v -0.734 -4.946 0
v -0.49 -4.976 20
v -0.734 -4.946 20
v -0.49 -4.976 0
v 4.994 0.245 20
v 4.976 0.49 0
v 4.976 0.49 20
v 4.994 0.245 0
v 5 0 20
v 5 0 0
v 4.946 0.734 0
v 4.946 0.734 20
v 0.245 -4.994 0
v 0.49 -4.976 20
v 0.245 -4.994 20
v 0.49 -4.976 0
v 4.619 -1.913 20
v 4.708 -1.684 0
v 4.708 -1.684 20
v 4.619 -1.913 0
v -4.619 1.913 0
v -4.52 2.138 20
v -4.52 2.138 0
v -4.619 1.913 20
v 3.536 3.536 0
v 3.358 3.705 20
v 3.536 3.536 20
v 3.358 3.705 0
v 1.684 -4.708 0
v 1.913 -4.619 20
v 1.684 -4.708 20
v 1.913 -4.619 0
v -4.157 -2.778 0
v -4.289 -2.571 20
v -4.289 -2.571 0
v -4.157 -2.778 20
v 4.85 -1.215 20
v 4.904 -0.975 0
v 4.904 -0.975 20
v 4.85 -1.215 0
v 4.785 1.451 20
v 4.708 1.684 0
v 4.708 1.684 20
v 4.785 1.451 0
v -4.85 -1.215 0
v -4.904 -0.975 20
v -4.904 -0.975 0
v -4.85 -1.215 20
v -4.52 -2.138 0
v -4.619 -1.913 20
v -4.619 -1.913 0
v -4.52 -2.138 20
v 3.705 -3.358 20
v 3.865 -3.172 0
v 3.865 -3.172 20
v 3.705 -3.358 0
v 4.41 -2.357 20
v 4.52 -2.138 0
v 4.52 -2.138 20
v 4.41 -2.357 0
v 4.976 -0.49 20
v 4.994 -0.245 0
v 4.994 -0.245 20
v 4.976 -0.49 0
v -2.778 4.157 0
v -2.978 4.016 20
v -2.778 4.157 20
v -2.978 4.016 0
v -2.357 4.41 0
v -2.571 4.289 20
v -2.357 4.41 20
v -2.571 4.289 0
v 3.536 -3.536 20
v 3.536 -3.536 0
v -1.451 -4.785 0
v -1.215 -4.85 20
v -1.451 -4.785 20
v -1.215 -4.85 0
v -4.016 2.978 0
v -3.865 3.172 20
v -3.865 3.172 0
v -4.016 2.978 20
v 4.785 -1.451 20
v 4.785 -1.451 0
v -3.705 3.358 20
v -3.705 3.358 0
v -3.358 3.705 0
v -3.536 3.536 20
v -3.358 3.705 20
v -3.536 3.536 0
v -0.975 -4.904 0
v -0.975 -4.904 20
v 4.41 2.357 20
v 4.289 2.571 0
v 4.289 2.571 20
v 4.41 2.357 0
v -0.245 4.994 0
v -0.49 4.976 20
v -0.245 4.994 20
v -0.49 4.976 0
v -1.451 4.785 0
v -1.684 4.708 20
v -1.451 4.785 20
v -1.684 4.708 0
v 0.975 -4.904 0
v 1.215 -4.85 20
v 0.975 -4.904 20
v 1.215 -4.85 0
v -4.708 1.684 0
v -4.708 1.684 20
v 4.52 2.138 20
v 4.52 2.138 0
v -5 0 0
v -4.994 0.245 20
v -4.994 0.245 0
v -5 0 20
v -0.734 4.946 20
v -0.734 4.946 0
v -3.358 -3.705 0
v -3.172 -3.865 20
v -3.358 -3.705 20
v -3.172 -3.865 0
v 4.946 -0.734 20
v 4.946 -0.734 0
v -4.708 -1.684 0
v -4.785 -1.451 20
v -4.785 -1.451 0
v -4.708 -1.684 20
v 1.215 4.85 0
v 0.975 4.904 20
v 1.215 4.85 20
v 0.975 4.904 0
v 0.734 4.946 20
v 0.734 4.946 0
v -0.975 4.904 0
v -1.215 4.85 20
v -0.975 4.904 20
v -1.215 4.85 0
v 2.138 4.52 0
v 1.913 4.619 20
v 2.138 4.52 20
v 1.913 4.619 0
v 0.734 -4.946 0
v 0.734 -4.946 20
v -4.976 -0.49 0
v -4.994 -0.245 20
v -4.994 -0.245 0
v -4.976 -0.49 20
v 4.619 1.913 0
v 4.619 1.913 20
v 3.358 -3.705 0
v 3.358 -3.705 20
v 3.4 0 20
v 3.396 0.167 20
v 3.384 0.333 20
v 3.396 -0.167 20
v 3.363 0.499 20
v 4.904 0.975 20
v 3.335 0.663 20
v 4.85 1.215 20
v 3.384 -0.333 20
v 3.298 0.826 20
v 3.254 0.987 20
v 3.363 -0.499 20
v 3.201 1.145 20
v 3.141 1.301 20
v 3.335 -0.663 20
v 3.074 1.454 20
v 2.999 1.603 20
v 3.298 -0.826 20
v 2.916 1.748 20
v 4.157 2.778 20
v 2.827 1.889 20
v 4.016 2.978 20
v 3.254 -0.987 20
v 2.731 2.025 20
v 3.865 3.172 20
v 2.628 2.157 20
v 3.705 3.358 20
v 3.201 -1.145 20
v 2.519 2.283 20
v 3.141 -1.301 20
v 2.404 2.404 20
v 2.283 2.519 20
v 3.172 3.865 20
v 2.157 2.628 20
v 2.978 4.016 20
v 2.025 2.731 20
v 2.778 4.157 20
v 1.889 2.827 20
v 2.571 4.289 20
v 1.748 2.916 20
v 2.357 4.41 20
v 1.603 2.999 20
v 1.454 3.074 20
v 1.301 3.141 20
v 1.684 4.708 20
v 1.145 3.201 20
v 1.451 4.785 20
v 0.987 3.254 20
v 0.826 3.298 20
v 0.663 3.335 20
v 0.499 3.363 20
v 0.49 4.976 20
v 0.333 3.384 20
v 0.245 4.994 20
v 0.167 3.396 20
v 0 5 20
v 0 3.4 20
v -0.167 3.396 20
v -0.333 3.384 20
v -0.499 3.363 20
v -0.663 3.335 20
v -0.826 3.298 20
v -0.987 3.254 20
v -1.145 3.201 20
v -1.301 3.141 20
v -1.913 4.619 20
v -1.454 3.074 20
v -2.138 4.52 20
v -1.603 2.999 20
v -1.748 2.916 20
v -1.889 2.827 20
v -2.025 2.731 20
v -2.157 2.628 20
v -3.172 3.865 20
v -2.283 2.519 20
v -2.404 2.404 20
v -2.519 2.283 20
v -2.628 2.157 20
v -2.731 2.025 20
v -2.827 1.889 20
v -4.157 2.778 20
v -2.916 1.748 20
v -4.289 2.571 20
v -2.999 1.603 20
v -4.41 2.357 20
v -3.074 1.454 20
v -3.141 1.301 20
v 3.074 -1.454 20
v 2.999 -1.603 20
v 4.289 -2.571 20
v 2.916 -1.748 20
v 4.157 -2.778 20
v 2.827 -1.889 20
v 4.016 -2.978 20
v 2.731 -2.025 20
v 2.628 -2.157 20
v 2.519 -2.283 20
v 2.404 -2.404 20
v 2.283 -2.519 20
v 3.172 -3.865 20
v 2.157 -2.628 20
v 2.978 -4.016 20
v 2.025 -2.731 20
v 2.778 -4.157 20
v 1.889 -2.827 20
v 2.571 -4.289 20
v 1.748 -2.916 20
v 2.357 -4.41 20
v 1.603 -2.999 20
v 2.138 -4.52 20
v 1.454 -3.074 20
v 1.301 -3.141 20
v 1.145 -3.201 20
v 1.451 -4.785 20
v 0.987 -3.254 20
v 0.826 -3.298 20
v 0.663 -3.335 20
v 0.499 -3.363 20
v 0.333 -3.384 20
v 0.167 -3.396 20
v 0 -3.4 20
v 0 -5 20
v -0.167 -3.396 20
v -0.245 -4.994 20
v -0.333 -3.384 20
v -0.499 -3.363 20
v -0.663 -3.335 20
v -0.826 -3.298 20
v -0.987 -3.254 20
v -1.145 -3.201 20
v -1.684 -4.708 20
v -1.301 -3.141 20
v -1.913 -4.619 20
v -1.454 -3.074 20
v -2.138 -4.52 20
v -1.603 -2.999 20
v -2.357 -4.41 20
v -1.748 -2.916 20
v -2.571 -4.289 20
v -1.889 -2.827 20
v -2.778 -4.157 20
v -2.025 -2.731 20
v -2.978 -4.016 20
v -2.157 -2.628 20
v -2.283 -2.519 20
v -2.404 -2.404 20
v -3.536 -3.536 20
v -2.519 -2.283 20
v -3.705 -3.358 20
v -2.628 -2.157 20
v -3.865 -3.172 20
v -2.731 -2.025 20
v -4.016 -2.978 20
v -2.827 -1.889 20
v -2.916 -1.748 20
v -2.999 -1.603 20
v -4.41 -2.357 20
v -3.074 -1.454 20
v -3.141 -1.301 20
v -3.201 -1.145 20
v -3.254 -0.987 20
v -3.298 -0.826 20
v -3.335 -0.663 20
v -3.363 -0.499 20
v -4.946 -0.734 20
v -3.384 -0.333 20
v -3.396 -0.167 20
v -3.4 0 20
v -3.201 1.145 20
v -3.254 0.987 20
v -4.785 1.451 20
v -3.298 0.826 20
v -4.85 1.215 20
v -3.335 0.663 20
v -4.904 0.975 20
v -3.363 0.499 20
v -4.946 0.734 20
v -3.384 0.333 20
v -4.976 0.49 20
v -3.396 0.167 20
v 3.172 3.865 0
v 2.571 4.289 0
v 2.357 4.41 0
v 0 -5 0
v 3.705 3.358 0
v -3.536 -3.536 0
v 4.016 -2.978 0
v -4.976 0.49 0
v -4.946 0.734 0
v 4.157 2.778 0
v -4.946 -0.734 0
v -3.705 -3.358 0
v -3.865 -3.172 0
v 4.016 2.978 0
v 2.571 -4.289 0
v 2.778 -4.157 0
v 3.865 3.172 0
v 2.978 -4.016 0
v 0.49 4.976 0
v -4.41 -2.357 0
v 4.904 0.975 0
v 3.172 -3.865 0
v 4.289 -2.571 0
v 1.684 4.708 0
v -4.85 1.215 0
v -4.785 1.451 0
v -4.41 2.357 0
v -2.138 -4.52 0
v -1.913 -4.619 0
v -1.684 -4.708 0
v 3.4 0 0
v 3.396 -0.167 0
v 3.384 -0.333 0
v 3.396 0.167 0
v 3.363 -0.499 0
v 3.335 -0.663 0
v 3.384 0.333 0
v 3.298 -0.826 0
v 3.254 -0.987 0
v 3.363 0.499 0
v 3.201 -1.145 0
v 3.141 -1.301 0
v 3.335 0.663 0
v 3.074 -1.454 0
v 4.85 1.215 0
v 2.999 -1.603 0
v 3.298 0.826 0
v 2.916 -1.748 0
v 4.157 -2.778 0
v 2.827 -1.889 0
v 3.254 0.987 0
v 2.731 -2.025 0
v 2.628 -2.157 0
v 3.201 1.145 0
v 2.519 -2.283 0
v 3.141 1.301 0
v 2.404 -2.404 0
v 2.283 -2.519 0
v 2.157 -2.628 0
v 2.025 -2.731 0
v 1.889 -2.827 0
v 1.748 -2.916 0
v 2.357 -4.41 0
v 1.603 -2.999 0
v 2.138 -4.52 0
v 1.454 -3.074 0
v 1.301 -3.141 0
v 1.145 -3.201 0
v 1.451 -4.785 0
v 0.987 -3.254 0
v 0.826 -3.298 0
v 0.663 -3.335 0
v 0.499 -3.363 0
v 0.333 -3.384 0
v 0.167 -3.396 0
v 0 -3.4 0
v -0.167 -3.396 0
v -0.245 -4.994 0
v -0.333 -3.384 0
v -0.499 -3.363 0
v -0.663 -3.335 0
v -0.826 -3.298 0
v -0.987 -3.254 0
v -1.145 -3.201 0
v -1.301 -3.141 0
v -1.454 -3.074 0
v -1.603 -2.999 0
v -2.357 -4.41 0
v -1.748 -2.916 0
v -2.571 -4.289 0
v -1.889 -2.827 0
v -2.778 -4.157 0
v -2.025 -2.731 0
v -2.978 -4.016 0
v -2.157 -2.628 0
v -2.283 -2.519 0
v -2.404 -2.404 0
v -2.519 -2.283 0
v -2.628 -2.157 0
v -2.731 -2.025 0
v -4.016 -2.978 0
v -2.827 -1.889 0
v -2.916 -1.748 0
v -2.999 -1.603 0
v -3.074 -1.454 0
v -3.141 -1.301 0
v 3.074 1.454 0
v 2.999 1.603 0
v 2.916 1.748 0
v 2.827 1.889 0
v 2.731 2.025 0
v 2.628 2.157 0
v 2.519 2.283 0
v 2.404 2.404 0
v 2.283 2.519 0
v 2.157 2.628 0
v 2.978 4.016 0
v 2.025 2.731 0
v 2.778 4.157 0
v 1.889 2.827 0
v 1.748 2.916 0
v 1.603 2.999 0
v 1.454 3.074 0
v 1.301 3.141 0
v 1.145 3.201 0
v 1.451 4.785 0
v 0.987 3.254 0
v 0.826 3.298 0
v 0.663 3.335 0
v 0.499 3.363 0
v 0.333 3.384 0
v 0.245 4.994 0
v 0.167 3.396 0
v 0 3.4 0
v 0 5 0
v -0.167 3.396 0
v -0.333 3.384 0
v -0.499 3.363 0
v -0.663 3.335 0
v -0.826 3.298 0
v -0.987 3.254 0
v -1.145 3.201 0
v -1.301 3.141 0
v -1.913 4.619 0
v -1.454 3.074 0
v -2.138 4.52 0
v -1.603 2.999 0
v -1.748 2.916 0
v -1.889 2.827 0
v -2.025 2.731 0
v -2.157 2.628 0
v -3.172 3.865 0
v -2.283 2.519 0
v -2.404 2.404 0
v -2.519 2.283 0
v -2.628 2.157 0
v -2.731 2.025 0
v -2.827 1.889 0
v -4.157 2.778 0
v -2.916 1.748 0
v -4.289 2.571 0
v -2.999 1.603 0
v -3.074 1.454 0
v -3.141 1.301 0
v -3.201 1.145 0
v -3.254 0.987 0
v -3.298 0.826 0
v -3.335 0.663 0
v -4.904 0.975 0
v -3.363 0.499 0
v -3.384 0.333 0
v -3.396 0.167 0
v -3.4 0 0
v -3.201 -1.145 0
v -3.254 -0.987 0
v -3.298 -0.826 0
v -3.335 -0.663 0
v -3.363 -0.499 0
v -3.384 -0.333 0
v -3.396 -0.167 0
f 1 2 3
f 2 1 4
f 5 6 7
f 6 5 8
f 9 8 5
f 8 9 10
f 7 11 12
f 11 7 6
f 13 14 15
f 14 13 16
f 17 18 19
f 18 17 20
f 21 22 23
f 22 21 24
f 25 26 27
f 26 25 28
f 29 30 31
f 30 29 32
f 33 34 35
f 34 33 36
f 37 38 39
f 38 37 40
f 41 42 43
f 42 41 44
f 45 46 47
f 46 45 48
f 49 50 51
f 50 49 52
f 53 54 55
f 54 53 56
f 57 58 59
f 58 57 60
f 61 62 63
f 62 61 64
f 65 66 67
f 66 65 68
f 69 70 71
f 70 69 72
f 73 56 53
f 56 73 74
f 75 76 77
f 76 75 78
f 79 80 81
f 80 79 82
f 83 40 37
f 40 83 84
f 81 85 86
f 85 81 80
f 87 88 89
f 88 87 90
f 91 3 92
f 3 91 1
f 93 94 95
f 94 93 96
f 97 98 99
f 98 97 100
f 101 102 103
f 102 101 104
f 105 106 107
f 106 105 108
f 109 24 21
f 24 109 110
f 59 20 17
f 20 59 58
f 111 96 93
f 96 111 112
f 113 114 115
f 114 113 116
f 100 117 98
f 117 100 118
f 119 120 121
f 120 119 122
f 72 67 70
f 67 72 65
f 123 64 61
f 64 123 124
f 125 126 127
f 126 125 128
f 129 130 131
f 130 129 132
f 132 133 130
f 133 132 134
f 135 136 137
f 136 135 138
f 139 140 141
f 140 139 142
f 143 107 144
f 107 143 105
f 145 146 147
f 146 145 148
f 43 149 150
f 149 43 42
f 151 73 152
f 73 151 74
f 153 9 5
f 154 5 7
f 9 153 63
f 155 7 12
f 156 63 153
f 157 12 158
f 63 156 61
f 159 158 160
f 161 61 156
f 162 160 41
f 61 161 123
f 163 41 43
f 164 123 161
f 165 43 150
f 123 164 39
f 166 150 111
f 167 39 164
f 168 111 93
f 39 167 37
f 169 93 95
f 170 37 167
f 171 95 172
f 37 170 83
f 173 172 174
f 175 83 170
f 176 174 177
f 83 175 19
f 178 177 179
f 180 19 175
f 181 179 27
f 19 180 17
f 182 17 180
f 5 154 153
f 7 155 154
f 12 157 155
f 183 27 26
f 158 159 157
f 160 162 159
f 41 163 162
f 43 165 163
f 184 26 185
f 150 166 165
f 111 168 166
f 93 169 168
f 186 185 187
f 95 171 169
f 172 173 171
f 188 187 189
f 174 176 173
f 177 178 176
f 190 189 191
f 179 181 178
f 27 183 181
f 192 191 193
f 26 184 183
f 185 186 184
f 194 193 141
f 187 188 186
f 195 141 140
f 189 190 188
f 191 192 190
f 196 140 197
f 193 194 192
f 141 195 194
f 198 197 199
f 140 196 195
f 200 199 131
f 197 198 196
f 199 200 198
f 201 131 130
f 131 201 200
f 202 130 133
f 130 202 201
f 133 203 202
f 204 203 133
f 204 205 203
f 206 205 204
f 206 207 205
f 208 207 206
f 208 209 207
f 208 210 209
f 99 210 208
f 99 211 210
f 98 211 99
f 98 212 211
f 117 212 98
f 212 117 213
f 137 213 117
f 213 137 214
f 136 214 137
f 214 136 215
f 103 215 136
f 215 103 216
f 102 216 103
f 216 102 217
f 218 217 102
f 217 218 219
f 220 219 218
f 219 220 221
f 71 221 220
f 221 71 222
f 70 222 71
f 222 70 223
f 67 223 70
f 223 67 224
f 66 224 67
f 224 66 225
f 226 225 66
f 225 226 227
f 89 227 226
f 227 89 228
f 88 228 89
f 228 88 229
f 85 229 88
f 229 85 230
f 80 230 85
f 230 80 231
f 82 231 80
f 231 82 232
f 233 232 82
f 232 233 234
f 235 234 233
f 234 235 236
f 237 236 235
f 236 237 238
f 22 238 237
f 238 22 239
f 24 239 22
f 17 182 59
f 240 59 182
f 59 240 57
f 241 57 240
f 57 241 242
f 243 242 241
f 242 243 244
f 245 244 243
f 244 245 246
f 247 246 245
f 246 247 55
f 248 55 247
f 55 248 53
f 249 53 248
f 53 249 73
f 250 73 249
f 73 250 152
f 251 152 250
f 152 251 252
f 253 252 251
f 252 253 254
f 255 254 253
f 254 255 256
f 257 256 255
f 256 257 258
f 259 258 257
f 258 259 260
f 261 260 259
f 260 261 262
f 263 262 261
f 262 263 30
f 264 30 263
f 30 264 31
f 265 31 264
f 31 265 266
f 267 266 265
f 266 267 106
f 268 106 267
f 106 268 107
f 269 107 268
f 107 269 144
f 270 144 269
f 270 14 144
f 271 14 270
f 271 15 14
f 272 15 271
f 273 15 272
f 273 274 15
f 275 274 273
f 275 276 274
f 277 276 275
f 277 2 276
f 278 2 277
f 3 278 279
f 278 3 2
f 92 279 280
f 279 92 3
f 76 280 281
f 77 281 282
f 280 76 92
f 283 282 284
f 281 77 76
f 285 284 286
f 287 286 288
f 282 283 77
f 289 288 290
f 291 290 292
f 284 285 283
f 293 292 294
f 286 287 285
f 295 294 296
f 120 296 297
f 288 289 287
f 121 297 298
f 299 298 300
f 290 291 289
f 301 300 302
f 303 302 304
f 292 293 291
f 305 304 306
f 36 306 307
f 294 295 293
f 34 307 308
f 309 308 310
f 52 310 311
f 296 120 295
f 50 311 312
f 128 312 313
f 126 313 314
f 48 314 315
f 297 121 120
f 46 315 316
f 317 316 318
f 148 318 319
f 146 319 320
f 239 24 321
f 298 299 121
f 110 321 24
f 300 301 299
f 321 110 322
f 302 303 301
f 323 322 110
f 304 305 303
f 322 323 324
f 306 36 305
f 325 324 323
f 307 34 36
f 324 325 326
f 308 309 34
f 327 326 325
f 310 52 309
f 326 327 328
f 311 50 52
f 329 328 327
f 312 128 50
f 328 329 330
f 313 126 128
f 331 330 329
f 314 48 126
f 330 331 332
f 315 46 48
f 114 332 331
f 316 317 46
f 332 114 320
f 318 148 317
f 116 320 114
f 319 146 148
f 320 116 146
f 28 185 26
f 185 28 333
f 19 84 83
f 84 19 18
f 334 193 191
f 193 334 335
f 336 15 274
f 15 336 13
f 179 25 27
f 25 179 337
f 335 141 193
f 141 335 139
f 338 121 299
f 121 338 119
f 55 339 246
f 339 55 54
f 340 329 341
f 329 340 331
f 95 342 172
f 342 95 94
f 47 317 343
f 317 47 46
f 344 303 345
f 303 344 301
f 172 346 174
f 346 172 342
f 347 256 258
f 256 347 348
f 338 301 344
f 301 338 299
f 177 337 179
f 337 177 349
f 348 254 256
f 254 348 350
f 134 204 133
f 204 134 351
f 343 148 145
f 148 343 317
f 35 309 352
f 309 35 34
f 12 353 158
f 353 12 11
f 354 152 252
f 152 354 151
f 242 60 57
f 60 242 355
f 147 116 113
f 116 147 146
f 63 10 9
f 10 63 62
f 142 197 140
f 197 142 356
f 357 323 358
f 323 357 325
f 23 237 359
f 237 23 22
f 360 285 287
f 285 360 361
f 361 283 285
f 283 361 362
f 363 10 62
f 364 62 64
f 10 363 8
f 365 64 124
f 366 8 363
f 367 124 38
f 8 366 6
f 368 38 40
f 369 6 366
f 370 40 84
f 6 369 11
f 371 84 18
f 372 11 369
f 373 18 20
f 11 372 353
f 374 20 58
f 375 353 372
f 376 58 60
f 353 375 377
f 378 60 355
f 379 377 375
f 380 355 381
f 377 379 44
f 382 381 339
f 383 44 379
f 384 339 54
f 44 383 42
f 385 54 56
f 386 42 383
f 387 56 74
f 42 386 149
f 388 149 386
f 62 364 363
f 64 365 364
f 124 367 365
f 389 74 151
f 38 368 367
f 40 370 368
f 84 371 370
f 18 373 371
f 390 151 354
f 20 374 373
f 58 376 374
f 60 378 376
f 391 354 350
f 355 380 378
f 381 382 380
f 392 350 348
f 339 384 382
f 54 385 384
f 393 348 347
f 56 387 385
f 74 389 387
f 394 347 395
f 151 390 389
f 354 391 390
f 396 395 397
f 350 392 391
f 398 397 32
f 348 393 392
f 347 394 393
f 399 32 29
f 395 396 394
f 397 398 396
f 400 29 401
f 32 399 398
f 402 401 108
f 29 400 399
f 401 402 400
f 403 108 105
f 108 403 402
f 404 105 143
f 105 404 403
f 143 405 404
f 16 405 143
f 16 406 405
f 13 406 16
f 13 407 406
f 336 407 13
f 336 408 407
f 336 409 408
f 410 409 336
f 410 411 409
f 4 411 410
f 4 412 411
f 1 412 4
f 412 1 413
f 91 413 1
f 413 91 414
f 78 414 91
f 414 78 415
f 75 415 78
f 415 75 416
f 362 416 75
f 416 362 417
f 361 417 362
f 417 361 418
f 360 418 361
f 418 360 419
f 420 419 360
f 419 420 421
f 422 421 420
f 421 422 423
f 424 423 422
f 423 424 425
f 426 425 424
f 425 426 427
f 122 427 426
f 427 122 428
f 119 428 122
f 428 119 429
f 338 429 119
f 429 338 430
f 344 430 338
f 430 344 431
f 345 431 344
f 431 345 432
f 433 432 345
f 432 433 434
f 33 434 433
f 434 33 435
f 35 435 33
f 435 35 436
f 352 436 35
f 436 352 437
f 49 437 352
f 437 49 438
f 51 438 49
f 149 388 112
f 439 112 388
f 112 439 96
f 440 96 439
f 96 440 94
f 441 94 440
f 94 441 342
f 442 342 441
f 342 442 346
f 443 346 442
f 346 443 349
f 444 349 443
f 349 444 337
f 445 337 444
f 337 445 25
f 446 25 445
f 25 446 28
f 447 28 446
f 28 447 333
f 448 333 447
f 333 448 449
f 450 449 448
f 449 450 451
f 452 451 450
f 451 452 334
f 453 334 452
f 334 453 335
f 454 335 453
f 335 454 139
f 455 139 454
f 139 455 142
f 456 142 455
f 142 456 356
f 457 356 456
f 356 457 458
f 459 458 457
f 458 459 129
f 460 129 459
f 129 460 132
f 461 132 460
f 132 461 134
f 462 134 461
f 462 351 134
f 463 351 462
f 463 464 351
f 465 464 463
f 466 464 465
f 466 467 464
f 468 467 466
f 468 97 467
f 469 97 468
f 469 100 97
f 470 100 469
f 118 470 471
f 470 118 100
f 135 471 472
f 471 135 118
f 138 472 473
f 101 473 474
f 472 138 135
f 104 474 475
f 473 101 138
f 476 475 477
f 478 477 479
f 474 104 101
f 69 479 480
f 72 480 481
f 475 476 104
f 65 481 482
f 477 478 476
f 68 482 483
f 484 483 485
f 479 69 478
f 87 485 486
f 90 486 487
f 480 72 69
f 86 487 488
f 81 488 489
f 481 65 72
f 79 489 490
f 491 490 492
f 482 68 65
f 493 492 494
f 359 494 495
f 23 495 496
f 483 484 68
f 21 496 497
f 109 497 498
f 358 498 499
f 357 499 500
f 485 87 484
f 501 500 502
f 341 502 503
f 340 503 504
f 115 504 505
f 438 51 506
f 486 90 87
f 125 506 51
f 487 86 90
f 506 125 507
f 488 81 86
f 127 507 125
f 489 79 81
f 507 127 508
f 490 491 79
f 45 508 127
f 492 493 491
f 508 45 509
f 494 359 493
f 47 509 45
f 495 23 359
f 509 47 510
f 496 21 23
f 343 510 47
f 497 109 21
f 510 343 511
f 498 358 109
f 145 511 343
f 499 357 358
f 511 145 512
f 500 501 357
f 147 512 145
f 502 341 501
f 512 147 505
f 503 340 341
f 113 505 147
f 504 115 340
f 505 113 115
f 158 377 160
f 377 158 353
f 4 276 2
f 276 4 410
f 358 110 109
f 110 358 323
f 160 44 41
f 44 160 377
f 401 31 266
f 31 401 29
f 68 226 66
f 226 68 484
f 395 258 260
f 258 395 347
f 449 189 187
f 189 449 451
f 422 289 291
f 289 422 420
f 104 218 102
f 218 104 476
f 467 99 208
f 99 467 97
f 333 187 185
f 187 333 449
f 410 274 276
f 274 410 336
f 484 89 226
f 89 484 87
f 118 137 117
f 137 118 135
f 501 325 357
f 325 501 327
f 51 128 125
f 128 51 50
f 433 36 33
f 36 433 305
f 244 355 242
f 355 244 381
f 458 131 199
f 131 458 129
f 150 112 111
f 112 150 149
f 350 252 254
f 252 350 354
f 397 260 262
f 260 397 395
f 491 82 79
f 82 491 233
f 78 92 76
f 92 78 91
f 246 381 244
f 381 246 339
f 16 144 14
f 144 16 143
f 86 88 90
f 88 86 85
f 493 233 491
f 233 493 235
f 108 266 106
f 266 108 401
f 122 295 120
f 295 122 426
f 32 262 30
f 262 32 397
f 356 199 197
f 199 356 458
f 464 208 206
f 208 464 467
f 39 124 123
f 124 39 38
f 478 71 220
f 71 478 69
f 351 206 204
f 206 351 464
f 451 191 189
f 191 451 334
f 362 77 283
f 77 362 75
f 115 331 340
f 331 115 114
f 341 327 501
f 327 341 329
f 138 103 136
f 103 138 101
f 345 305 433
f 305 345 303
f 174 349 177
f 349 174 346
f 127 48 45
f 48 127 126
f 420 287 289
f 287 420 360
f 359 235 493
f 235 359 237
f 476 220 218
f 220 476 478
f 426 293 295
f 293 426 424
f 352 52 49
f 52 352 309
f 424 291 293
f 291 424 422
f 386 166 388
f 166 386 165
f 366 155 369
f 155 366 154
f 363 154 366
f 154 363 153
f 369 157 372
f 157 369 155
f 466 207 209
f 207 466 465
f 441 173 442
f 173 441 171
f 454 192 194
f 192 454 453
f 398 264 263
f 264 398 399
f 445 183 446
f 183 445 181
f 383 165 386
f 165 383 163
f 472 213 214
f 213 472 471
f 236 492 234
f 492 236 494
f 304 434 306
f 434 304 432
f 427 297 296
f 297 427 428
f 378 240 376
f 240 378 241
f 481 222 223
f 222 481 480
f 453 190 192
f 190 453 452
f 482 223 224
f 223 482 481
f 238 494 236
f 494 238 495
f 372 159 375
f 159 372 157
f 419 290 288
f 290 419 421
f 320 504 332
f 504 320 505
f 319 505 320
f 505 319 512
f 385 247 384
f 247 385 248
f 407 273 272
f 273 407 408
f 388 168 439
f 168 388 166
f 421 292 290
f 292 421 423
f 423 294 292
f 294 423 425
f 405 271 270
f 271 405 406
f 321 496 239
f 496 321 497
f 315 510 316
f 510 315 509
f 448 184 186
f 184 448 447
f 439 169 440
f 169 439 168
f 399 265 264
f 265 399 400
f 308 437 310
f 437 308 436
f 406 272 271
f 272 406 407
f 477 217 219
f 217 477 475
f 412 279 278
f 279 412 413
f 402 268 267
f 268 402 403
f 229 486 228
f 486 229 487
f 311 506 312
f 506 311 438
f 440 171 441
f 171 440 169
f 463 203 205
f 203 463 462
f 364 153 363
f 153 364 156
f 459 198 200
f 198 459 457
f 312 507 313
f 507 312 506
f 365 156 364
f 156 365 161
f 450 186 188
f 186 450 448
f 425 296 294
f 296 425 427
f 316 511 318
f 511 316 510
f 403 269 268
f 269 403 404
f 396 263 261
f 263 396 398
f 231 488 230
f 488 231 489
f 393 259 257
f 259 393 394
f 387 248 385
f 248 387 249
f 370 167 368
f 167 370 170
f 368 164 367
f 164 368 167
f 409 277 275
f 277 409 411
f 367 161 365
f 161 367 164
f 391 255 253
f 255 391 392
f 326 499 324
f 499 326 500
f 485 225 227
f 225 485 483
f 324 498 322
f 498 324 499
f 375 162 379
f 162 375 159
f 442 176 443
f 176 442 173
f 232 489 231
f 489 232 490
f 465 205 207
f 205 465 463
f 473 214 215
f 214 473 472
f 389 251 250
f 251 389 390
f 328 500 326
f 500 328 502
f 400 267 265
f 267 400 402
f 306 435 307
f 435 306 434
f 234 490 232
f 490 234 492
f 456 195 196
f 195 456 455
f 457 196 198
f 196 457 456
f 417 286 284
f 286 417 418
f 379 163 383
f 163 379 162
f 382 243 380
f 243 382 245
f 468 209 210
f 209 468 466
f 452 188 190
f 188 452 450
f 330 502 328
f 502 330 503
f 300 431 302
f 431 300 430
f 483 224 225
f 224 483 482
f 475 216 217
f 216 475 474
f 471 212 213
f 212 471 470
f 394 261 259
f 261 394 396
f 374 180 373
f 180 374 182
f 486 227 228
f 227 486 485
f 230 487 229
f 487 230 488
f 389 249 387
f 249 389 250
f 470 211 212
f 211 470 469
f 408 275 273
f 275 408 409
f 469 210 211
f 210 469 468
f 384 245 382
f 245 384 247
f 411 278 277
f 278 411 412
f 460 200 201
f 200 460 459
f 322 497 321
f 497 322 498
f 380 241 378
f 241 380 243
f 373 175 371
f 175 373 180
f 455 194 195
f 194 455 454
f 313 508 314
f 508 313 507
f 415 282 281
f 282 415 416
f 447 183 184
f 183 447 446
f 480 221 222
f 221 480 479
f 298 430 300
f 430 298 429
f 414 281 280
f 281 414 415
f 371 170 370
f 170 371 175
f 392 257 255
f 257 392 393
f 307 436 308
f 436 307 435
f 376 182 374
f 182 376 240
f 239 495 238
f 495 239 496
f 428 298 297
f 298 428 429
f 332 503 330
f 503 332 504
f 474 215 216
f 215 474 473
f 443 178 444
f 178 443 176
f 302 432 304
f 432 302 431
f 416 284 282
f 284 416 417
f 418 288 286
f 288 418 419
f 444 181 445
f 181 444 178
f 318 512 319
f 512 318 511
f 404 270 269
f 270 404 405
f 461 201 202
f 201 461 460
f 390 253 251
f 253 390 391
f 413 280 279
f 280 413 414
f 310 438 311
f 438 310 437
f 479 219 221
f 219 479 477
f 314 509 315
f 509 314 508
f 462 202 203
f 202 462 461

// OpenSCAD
// Lab Funnel Design - Corrected
// Units: millimetres
// Orientation: Upright, wide opening at top, rests on XY plane at z=0

$fn = 128; // High resolution for smooth curves

// Spout (Tube)
spout_outer_diameter = 10;
spout_inner_diameter = 6.8;
spout_length = 20;
spout_wall_thickness = 1.6;

// Cone (Funnel)
cone_bottom_diameter = 10; // Matches spout outer diameter
cone_top_diameter = 60;
cone_height = 30; // From z=20 to z=50

// Wall Thickness
wall_thickness = 1.6;

// Derived Cone Dimensions
cone_bottom_inner_diameter = cone_bottom_diameter - 2 * wall_thickness;
cone_top_inner_diameter = cone_top_diameter - 2 * wall_thickness;

difference() {
    // --- OUTER SHELL ---
    union() {
        // 1. Spout Outer Cylinder (z=0 to z=20)
        cylinder(
            h = spout_length,
            d = spout_outer_diameter,
            center = false
        );

        // 2. Cone Outer Frustum (z=20 to z=50)
        // Translate to start at z=20
        translate([0, 0, spout_length]) {
            // Profile: Line from (radius_bottom, 0) to (radius_top, cone_height)
            // rotate_extrude rotates around the Z axis.
            // The profile must be defined in the XZ plane (y=0).
            // Points are [x, z].
            rotate_extrude($fn = $fn) {
                polygon([
                    [cone_bottom_diameter/2, 0],
                    [cone_top_diameter/2, cone_height]
                ]);
            }
        }
    }

    // --- INNER VOID ---
    union() {
        // 1. Inner Cylinder Void (z=0 to z=20)
        cylinder(
            h = spout_length,
            d = spout_inner_diameter,
            center = false
        );

        // 2. Inner Cone Void (z=20 to z=50)
        translate([0, 0, spout_length]) {
            rotate_extrude($fn = $fn) {
                // Profile for inner cone
                // Start at bottom inner radius, go up to top inner radius
                polygon([
                    [cone_bottom_inner_diameter/2, 0],
                    [cone_top_inner_diameter/2, cone_height]
                ]);
            }
        }
    }
}
